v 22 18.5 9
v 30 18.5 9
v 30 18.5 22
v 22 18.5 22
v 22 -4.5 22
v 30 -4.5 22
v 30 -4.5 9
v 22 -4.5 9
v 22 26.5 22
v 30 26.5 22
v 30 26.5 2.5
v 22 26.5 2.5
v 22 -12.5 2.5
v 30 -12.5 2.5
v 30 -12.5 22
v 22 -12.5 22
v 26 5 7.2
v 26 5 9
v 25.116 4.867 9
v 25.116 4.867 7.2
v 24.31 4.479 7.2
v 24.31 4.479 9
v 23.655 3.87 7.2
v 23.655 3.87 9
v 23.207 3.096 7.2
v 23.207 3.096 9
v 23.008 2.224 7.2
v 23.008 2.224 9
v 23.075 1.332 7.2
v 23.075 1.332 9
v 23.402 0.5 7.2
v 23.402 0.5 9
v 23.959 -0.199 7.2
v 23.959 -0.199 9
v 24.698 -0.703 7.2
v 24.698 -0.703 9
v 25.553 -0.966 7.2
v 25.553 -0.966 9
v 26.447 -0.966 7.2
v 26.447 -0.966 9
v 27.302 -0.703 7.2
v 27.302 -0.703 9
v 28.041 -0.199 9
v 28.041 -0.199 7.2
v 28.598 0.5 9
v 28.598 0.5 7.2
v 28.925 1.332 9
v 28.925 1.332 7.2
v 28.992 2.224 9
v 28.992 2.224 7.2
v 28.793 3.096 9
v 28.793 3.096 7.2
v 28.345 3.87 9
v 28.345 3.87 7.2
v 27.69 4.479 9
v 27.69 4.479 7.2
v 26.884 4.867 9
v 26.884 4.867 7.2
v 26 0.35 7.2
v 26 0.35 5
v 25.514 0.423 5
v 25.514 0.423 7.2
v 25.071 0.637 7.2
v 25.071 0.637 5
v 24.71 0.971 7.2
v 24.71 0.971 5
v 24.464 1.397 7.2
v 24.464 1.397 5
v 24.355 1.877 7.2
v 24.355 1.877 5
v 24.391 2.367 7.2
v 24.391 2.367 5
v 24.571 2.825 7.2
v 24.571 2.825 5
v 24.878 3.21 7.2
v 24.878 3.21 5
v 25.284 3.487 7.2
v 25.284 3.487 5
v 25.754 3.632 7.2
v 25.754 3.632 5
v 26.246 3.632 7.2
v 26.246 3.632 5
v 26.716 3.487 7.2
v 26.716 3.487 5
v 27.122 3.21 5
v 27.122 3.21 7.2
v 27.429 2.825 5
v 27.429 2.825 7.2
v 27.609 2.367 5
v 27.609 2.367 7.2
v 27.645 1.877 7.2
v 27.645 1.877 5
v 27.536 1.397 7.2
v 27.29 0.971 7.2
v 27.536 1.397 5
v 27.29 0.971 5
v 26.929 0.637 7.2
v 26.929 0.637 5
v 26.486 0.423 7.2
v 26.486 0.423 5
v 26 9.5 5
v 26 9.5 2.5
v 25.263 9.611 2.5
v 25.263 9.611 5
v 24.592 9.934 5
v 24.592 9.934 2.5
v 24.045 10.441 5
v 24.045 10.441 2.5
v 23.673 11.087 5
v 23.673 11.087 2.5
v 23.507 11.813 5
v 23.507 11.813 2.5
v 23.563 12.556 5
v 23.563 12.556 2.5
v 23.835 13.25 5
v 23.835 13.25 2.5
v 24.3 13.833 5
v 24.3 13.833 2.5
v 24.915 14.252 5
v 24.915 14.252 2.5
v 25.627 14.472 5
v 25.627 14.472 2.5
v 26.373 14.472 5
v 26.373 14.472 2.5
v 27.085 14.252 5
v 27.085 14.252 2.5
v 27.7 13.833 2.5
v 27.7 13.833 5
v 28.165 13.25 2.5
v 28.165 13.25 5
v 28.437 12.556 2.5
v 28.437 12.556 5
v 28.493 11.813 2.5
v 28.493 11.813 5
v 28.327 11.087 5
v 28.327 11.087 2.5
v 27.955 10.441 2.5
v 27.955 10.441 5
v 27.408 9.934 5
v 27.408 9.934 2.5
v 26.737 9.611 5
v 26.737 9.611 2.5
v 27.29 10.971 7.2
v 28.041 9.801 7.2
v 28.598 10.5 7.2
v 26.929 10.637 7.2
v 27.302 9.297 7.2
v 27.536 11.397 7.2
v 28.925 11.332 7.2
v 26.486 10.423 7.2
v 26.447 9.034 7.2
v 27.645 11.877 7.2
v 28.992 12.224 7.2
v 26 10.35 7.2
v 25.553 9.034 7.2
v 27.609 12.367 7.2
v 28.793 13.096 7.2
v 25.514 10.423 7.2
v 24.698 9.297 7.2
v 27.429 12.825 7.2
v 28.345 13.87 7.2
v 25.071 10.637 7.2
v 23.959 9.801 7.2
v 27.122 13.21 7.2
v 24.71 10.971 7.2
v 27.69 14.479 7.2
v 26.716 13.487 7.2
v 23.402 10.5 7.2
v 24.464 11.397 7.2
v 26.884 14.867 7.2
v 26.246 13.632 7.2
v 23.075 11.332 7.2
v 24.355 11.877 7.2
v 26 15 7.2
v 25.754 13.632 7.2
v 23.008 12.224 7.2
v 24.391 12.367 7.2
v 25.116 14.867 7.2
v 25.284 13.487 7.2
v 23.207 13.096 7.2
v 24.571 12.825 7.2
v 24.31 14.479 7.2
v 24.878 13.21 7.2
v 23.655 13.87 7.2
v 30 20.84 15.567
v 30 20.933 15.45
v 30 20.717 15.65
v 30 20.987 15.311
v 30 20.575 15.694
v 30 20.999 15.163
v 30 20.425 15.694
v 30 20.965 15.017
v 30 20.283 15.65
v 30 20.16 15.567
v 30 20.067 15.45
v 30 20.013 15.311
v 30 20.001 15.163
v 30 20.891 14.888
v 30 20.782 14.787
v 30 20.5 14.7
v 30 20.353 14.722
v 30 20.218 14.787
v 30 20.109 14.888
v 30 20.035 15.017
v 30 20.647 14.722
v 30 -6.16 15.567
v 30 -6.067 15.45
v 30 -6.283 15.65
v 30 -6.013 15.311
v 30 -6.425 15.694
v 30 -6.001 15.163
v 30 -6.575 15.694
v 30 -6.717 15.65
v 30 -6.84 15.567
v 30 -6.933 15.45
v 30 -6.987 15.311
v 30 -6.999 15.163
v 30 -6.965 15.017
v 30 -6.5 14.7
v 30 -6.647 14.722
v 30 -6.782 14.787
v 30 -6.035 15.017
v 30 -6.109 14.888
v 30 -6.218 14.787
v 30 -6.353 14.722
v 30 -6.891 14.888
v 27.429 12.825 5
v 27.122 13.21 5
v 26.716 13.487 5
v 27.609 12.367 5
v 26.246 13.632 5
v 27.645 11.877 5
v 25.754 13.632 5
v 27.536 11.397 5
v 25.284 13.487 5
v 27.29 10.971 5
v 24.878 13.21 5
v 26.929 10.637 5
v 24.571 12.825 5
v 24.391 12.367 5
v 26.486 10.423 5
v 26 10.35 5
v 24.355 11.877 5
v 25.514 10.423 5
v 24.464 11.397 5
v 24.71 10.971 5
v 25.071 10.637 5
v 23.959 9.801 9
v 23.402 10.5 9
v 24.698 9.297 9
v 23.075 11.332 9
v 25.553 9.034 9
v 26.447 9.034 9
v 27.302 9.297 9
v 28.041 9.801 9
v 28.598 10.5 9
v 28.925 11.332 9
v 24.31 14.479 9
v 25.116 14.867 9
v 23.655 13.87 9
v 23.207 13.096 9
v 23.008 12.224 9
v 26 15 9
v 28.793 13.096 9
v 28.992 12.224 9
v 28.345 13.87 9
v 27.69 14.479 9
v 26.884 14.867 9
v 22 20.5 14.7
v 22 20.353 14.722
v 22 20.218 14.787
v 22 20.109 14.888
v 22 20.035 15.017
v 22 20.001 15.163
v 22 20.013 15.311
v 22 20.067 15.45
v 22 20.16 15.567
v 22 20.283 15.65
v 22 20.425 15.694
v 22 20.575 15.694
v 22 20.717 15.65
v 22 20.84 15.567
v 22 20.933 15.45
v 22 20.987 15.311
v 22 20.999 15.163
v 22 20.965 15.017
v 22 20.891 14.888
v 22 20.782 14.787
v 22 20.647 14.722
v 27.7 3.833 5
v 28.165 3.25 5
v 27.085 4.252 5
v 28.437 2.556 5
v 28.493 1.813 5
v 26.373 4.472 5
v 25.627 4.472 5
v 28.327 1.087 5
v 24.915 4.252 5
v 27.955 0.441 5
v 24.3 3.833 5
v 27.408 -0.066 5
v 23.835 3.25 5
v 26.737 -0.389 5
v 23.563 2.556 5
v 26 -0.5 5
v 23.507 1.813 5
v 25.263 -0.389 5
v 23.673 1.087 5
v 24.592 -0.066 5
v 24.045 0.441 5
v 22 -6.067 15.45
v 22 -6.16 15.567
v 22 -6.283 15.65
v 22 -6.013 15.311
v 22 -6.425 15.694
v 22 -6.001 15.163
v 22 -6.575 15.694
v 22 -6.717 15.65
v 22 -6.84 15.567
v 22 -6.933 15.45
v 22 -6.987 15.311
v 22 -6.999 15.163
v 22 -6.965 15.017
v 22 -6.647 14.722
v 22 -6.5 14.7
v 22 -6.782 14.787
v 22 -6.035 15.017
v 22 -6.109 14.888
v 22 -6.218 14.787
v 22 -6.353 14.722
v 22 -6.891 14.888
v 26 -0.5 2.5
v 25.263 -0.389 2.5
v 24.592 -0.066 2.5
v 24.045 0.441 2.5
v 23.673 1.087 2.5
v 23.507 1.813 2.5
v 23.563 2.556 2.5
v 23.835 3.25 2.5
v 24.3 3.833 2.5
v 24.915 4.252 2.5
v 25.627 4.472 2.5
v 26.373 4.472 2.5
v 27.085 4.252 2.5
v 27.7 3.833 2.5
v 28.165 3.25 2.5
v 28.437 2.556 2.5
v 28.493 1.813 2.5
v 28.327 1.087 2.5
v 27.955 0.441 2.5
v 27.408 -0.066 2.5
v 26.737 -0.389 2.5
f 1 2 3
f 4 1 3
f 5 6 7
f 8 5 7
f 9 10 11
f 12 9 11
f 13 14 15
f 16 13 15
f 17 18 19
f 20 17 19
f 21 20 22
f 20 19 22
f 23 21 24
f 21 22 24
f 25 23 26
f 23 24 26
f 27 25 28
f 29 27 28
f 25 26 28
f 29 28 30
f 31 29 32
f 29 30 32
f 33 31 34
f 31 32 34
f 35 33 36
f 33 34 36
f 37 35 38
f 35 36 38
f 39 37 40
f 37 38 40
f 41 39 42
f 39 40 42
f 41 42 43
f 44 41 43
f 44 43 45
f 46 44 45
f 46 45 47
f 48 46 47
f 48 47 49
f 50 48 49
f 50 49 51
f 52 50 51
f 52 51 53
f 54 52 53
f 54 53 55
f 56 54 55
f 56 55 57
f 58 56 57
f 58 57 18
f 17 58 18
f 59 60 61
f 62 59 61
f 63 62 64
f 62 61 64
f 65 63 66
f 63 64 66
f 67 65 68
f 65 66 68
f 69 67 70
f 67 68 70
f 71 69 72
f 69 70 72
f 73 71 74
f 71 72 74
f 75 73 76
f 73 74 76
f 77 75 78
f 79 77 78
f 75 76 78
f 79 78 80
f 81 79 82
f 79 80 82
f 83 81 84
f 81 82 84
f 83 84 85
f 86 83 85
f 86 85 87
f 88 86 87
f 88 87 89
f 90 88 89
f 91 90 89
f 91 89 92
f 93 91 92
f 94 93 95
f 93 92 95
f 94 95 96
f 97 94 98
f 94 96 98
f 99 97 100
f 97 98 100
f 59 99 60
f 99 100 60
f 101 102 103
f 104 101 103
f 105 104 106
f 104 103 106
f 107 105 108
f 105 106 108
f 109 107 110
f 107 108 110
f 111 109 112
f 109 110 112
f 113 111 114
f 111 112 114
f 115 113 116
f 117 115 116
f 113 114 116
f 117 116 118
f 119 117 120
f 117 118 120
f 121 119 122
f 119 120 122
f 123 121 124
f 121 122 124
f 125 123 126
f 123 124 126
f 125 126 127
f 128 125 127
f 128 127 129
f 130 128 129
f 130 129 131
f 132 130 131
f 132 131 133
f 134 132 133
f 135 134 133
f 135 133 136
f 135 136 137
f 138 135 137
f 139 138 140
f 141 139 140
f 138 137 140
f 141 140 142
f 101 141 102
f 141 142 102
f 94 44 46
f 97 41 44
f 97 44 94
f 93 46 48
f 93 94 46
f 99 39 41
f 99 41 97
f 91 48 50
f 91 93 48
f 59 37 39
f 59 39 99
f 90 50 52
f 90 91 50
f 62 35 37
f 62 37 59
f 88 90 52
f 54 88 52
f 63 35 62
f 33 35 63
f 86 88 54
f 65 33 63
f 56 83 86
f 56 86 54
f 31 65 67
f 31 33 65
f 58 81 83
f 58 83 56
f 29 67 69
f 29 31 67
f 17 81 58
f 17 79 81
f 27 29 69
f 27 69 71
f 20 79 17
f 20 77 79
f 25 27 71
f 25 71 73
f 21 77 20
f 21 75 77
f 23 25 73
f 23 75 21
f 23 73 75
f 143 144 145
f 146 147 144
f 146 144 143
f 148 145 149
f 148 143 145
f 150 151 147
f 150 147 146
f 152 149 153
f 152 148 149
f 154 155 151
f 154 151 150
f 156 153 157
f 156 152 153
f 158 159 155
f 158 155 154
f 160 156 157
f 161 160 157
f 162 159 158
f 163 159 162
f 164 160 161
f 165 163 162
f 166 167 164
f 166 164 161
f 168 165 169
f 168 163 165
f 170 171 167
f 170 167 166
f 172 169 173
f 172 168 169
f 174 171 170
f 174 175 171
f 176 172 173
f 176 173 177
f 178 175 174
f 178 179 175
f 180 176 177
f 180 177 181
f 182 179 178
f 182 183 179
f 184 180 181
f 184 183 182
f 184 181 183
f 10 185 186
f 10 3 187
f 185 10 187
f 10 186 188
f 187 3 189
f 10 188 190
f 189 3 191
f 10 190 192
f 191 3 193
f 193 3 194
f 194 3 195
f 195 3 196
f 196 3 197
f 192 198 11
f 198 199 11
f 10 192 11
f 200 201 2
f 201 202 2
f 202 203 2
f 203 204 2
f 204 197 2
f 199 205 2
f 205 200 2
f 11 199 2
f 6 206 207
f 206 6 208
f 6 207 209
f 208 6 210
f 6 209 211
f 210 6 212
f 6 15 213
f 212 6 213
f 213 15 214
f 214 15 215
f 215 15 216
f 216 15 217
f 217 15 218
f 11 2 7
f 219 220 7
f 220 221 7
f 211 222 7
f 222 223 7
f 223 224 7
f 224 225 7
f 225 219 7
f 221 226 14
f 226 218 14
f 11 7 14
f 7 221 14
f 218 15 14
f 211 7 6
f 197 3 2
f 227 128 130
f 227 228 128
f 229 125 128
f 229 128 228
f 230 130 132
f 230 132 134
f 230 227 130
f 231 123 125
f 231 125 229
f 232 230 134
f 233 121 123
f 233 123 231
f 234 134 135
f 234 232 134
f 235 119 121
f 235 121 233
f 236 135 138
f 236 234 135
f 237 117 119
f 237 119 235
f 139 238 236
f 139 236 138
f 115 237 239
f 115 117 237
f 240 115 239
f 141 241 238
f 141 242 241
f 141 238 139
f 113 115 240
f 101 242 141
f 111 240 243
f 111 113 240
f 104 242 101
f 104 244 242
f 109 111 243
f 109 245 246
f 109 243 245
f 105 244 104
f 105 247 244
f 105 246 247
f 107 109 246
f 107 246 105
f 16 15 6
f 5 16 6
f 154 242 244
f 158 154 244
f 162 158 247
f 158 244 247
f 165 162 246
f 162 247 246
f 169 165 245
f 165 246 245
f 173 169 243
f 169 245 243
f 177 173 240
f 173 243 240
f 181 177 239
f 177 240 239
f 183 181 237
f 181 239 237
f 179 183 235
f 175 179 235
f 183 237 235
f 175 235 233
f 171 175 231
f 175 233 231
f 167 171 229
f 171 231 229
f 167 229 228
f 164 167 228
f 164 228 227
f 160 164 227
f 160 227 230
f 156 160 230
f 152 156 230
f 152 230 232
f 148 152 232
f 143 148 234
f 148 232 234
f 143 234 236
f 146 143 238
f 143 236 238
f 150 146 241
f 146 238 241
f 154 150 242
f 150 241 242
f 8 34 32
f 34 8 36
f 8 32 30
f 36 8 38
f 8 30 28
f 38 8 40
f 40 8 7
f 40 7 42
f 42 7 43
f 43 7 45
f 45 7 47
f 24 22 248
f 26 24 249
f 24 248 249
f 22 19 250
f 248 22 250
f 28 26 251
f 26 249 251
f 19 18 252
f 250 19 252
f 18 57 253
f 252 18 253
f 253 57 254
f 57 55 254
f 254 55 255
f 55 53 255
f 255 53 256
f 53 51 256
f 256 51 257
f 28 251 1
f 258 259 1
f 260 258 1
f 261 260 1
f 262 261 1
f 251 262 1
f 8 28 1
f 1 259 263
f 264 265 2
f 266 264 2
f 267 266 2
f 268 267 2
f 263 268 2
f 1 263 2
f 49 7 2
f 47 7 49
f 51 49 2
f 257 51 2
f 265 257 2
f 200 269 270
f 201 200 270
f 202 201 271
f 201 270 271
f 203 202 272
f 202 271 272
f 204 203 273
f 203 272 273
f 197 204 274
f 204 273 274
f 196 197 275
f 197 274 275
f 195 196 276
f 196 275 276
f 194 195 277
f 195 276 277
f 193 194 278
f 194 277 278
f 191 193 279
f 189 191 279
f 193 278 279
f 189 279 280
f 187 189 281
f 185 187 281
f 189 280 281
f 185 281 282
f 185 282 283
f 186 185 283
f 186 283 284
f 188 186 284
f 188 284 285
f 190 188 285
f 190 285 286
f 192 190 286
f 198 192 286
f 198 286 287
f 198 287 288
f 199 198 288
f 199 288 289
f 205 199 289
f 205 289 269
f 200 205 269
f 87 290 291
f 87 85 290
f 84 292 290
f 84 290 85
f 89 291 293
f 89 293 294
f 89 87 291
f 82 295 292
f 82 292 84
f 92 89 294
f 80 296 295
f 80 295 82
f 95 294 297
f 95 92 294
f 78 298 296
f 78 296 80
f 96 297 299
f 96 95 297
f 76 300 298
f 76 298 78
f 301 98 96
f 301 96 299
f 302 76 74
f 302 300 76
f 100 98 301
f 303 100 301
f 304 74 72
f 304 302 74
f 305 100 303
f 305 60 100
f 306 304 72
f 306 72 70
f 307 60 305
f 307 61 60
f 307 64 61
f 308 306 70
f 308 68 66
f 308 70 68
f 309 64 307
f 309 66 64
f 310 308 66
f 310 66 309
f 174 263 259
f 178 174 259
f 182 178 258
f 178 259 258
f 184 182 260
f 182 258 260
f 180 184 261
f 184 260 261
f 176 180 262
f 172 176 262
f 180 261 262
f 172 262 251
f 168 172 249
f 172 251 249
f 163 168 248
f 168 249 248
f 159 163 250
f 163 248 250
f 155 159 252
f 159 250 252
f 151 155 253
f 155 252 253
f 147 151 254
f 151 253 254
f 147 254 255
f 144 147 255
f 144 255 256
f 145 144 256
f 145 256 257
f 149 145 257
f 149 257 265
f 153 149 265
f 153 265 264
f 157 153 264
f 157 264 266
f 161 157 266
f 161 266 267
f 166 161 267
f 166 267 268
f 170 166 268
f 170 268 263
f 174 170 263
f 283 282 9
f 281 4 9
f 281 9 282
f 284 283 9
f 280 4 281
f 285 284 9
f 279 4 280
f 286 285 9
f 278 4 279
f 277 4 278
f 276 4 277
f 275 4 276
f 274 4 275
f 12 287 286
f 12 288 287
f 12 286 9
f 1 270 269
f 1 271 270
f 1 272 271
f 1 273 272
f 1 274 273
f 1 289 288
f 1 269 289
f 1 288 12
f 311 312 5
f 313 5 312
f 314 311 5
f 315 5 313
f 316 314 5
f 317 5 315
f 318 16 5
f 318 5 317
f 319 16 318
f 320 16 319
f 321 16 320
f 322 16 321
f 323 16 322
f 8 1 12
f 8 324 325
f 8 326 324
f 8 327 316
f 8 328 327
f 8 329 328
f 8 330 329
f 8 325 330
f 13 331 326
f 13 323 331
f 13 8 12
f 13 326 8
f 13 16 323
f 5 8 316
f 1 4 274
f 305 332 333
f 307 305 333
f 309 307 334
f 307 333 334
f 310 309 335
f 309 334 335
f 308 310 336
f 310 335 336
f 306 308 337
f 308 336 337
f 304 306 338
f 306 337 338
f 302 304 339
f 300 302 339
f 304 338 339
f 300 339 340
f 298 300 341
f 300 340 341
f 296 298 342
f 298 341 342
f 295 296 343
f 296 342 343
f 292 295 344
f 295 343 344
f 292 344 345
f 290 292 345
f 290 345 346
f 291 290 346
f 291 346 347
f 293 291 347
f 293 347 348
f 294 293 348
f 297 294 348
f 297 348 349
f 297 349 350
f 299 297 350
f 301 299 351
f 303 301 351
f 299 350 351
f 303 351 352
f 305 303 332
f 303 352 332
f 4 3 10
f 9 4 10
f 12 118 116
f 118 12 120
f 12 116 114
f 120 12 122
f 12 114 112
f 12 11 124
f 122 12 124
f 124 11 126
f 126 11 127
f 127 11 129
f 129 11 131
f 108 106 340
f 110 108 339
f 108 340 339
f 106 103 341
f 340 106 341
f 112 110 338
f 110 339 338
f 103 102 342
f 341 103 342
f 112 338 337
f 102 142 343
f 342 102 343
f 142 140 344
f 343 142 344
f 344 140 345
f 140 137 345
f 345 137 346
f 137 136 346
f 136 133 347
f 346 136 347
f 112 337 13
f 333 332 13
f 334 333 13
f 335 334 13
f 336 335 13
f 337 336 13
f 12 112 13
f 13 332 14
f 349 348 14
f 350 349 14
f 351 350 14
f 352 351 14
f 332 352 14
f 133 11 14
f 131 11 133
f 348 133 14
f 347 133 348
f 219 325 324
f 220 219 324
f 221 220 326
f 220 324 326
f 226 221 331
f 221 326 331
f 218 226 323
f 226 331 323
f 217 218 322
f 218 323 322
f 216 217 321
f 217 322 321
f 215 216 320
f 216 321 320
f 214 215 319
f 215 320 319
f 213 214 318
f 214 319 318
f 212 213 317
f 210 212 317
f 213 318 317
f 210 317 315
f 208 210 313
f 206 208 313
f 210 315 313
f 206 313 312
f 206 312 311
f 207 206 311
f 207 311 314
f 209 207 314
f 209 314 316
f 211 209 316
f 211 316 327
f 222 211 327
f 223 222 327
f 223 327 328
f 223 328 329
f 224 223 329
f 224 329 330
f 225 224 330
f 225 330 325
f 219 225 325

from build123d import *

# Parameters (mm, degrees)
PAD003_DEPTH            = 8
HOLE_D                  = 3.3
HOLE_DEPTH              = 25
HOLE_CBORE_D            = 6
HOLE_CBORE_DEPTH        = 1.8
SKETCH010_R             = 0.5
POCKET004_DEPTH         = 8.001
SKETCH008_R             = 2.5
POCKET005_DEPTH         = 2.5
BODY003_PITCH_ANGLE     = 90
BODY003_PLACEMENT_ANGLE = -180


with BuildPart() as part:
    # Sketch009 → Pad003 (new body)
    with BuildSketch(Plane.XY):
        Polygon((0, 19.5), (0, 11.5), (13, 11.5), (13, -11.5), (0, -11.5), (0, -19.5), (19.5, -19.5), (19.5, 19.5), align=None)
    extrude(amount=PAD003_DEPTH)

    # Hole
    with Locations(Plane(origin=(13, 0, 0), x_dir=(0, -1, 0), z_dir=(-1, 0, 0))):
        with Locations((-5, 4), (5, 4)):
            CounterBoreHole(HOLE_D / 2, HOLE_CBORE_D / 2, HOLE_CBORE_DEPTH, depth=HOLE_DEPTH)

    # Sketch010 (on Face5 of Hole) → Pocket004 (cut, through all)
    with BuildSketch(Plane.XY.offset(8)):
        with Locations((6.8, 13.5)):
            Circle(SKETCH010_R)
        with Locations((6.8, -13.5)):
            Circle(SKETCH010_R)
    extrude(amount=-POCKET004_DEPTH, mode=Mode.SUBTRACT)

    # Sketch008 (on Face6 of Pocket004) → Pocket005 (cut)
    with BuildSketch(Plane.YZ.offset(19.5)):
        with Locations((-5, 4)):
            Circle(SKETCH008_R)
        with Locations((5, 4)):
            Circle(SKETCH008_R)
    extrude(amount=-POCKET005_DEPTH, mode=Mode.SUBTRACT)


with BuildPart() as part_1:
    # Body003 pitch: moved
    add(part.part.rotate(Axis((0, 0, 0), (0, 1, 0)), BODY003_PITCH_ANGLE))


with BuildPart() as part_2:
    # Body003 placement: moved
    add(part_1.part.moved(Location((30, 7, 22))).rotate(Axis((30, 7, 22), (0, 0, 1)), BODY003_PLACEMENT_ANGLE))


solid = part_2.part
